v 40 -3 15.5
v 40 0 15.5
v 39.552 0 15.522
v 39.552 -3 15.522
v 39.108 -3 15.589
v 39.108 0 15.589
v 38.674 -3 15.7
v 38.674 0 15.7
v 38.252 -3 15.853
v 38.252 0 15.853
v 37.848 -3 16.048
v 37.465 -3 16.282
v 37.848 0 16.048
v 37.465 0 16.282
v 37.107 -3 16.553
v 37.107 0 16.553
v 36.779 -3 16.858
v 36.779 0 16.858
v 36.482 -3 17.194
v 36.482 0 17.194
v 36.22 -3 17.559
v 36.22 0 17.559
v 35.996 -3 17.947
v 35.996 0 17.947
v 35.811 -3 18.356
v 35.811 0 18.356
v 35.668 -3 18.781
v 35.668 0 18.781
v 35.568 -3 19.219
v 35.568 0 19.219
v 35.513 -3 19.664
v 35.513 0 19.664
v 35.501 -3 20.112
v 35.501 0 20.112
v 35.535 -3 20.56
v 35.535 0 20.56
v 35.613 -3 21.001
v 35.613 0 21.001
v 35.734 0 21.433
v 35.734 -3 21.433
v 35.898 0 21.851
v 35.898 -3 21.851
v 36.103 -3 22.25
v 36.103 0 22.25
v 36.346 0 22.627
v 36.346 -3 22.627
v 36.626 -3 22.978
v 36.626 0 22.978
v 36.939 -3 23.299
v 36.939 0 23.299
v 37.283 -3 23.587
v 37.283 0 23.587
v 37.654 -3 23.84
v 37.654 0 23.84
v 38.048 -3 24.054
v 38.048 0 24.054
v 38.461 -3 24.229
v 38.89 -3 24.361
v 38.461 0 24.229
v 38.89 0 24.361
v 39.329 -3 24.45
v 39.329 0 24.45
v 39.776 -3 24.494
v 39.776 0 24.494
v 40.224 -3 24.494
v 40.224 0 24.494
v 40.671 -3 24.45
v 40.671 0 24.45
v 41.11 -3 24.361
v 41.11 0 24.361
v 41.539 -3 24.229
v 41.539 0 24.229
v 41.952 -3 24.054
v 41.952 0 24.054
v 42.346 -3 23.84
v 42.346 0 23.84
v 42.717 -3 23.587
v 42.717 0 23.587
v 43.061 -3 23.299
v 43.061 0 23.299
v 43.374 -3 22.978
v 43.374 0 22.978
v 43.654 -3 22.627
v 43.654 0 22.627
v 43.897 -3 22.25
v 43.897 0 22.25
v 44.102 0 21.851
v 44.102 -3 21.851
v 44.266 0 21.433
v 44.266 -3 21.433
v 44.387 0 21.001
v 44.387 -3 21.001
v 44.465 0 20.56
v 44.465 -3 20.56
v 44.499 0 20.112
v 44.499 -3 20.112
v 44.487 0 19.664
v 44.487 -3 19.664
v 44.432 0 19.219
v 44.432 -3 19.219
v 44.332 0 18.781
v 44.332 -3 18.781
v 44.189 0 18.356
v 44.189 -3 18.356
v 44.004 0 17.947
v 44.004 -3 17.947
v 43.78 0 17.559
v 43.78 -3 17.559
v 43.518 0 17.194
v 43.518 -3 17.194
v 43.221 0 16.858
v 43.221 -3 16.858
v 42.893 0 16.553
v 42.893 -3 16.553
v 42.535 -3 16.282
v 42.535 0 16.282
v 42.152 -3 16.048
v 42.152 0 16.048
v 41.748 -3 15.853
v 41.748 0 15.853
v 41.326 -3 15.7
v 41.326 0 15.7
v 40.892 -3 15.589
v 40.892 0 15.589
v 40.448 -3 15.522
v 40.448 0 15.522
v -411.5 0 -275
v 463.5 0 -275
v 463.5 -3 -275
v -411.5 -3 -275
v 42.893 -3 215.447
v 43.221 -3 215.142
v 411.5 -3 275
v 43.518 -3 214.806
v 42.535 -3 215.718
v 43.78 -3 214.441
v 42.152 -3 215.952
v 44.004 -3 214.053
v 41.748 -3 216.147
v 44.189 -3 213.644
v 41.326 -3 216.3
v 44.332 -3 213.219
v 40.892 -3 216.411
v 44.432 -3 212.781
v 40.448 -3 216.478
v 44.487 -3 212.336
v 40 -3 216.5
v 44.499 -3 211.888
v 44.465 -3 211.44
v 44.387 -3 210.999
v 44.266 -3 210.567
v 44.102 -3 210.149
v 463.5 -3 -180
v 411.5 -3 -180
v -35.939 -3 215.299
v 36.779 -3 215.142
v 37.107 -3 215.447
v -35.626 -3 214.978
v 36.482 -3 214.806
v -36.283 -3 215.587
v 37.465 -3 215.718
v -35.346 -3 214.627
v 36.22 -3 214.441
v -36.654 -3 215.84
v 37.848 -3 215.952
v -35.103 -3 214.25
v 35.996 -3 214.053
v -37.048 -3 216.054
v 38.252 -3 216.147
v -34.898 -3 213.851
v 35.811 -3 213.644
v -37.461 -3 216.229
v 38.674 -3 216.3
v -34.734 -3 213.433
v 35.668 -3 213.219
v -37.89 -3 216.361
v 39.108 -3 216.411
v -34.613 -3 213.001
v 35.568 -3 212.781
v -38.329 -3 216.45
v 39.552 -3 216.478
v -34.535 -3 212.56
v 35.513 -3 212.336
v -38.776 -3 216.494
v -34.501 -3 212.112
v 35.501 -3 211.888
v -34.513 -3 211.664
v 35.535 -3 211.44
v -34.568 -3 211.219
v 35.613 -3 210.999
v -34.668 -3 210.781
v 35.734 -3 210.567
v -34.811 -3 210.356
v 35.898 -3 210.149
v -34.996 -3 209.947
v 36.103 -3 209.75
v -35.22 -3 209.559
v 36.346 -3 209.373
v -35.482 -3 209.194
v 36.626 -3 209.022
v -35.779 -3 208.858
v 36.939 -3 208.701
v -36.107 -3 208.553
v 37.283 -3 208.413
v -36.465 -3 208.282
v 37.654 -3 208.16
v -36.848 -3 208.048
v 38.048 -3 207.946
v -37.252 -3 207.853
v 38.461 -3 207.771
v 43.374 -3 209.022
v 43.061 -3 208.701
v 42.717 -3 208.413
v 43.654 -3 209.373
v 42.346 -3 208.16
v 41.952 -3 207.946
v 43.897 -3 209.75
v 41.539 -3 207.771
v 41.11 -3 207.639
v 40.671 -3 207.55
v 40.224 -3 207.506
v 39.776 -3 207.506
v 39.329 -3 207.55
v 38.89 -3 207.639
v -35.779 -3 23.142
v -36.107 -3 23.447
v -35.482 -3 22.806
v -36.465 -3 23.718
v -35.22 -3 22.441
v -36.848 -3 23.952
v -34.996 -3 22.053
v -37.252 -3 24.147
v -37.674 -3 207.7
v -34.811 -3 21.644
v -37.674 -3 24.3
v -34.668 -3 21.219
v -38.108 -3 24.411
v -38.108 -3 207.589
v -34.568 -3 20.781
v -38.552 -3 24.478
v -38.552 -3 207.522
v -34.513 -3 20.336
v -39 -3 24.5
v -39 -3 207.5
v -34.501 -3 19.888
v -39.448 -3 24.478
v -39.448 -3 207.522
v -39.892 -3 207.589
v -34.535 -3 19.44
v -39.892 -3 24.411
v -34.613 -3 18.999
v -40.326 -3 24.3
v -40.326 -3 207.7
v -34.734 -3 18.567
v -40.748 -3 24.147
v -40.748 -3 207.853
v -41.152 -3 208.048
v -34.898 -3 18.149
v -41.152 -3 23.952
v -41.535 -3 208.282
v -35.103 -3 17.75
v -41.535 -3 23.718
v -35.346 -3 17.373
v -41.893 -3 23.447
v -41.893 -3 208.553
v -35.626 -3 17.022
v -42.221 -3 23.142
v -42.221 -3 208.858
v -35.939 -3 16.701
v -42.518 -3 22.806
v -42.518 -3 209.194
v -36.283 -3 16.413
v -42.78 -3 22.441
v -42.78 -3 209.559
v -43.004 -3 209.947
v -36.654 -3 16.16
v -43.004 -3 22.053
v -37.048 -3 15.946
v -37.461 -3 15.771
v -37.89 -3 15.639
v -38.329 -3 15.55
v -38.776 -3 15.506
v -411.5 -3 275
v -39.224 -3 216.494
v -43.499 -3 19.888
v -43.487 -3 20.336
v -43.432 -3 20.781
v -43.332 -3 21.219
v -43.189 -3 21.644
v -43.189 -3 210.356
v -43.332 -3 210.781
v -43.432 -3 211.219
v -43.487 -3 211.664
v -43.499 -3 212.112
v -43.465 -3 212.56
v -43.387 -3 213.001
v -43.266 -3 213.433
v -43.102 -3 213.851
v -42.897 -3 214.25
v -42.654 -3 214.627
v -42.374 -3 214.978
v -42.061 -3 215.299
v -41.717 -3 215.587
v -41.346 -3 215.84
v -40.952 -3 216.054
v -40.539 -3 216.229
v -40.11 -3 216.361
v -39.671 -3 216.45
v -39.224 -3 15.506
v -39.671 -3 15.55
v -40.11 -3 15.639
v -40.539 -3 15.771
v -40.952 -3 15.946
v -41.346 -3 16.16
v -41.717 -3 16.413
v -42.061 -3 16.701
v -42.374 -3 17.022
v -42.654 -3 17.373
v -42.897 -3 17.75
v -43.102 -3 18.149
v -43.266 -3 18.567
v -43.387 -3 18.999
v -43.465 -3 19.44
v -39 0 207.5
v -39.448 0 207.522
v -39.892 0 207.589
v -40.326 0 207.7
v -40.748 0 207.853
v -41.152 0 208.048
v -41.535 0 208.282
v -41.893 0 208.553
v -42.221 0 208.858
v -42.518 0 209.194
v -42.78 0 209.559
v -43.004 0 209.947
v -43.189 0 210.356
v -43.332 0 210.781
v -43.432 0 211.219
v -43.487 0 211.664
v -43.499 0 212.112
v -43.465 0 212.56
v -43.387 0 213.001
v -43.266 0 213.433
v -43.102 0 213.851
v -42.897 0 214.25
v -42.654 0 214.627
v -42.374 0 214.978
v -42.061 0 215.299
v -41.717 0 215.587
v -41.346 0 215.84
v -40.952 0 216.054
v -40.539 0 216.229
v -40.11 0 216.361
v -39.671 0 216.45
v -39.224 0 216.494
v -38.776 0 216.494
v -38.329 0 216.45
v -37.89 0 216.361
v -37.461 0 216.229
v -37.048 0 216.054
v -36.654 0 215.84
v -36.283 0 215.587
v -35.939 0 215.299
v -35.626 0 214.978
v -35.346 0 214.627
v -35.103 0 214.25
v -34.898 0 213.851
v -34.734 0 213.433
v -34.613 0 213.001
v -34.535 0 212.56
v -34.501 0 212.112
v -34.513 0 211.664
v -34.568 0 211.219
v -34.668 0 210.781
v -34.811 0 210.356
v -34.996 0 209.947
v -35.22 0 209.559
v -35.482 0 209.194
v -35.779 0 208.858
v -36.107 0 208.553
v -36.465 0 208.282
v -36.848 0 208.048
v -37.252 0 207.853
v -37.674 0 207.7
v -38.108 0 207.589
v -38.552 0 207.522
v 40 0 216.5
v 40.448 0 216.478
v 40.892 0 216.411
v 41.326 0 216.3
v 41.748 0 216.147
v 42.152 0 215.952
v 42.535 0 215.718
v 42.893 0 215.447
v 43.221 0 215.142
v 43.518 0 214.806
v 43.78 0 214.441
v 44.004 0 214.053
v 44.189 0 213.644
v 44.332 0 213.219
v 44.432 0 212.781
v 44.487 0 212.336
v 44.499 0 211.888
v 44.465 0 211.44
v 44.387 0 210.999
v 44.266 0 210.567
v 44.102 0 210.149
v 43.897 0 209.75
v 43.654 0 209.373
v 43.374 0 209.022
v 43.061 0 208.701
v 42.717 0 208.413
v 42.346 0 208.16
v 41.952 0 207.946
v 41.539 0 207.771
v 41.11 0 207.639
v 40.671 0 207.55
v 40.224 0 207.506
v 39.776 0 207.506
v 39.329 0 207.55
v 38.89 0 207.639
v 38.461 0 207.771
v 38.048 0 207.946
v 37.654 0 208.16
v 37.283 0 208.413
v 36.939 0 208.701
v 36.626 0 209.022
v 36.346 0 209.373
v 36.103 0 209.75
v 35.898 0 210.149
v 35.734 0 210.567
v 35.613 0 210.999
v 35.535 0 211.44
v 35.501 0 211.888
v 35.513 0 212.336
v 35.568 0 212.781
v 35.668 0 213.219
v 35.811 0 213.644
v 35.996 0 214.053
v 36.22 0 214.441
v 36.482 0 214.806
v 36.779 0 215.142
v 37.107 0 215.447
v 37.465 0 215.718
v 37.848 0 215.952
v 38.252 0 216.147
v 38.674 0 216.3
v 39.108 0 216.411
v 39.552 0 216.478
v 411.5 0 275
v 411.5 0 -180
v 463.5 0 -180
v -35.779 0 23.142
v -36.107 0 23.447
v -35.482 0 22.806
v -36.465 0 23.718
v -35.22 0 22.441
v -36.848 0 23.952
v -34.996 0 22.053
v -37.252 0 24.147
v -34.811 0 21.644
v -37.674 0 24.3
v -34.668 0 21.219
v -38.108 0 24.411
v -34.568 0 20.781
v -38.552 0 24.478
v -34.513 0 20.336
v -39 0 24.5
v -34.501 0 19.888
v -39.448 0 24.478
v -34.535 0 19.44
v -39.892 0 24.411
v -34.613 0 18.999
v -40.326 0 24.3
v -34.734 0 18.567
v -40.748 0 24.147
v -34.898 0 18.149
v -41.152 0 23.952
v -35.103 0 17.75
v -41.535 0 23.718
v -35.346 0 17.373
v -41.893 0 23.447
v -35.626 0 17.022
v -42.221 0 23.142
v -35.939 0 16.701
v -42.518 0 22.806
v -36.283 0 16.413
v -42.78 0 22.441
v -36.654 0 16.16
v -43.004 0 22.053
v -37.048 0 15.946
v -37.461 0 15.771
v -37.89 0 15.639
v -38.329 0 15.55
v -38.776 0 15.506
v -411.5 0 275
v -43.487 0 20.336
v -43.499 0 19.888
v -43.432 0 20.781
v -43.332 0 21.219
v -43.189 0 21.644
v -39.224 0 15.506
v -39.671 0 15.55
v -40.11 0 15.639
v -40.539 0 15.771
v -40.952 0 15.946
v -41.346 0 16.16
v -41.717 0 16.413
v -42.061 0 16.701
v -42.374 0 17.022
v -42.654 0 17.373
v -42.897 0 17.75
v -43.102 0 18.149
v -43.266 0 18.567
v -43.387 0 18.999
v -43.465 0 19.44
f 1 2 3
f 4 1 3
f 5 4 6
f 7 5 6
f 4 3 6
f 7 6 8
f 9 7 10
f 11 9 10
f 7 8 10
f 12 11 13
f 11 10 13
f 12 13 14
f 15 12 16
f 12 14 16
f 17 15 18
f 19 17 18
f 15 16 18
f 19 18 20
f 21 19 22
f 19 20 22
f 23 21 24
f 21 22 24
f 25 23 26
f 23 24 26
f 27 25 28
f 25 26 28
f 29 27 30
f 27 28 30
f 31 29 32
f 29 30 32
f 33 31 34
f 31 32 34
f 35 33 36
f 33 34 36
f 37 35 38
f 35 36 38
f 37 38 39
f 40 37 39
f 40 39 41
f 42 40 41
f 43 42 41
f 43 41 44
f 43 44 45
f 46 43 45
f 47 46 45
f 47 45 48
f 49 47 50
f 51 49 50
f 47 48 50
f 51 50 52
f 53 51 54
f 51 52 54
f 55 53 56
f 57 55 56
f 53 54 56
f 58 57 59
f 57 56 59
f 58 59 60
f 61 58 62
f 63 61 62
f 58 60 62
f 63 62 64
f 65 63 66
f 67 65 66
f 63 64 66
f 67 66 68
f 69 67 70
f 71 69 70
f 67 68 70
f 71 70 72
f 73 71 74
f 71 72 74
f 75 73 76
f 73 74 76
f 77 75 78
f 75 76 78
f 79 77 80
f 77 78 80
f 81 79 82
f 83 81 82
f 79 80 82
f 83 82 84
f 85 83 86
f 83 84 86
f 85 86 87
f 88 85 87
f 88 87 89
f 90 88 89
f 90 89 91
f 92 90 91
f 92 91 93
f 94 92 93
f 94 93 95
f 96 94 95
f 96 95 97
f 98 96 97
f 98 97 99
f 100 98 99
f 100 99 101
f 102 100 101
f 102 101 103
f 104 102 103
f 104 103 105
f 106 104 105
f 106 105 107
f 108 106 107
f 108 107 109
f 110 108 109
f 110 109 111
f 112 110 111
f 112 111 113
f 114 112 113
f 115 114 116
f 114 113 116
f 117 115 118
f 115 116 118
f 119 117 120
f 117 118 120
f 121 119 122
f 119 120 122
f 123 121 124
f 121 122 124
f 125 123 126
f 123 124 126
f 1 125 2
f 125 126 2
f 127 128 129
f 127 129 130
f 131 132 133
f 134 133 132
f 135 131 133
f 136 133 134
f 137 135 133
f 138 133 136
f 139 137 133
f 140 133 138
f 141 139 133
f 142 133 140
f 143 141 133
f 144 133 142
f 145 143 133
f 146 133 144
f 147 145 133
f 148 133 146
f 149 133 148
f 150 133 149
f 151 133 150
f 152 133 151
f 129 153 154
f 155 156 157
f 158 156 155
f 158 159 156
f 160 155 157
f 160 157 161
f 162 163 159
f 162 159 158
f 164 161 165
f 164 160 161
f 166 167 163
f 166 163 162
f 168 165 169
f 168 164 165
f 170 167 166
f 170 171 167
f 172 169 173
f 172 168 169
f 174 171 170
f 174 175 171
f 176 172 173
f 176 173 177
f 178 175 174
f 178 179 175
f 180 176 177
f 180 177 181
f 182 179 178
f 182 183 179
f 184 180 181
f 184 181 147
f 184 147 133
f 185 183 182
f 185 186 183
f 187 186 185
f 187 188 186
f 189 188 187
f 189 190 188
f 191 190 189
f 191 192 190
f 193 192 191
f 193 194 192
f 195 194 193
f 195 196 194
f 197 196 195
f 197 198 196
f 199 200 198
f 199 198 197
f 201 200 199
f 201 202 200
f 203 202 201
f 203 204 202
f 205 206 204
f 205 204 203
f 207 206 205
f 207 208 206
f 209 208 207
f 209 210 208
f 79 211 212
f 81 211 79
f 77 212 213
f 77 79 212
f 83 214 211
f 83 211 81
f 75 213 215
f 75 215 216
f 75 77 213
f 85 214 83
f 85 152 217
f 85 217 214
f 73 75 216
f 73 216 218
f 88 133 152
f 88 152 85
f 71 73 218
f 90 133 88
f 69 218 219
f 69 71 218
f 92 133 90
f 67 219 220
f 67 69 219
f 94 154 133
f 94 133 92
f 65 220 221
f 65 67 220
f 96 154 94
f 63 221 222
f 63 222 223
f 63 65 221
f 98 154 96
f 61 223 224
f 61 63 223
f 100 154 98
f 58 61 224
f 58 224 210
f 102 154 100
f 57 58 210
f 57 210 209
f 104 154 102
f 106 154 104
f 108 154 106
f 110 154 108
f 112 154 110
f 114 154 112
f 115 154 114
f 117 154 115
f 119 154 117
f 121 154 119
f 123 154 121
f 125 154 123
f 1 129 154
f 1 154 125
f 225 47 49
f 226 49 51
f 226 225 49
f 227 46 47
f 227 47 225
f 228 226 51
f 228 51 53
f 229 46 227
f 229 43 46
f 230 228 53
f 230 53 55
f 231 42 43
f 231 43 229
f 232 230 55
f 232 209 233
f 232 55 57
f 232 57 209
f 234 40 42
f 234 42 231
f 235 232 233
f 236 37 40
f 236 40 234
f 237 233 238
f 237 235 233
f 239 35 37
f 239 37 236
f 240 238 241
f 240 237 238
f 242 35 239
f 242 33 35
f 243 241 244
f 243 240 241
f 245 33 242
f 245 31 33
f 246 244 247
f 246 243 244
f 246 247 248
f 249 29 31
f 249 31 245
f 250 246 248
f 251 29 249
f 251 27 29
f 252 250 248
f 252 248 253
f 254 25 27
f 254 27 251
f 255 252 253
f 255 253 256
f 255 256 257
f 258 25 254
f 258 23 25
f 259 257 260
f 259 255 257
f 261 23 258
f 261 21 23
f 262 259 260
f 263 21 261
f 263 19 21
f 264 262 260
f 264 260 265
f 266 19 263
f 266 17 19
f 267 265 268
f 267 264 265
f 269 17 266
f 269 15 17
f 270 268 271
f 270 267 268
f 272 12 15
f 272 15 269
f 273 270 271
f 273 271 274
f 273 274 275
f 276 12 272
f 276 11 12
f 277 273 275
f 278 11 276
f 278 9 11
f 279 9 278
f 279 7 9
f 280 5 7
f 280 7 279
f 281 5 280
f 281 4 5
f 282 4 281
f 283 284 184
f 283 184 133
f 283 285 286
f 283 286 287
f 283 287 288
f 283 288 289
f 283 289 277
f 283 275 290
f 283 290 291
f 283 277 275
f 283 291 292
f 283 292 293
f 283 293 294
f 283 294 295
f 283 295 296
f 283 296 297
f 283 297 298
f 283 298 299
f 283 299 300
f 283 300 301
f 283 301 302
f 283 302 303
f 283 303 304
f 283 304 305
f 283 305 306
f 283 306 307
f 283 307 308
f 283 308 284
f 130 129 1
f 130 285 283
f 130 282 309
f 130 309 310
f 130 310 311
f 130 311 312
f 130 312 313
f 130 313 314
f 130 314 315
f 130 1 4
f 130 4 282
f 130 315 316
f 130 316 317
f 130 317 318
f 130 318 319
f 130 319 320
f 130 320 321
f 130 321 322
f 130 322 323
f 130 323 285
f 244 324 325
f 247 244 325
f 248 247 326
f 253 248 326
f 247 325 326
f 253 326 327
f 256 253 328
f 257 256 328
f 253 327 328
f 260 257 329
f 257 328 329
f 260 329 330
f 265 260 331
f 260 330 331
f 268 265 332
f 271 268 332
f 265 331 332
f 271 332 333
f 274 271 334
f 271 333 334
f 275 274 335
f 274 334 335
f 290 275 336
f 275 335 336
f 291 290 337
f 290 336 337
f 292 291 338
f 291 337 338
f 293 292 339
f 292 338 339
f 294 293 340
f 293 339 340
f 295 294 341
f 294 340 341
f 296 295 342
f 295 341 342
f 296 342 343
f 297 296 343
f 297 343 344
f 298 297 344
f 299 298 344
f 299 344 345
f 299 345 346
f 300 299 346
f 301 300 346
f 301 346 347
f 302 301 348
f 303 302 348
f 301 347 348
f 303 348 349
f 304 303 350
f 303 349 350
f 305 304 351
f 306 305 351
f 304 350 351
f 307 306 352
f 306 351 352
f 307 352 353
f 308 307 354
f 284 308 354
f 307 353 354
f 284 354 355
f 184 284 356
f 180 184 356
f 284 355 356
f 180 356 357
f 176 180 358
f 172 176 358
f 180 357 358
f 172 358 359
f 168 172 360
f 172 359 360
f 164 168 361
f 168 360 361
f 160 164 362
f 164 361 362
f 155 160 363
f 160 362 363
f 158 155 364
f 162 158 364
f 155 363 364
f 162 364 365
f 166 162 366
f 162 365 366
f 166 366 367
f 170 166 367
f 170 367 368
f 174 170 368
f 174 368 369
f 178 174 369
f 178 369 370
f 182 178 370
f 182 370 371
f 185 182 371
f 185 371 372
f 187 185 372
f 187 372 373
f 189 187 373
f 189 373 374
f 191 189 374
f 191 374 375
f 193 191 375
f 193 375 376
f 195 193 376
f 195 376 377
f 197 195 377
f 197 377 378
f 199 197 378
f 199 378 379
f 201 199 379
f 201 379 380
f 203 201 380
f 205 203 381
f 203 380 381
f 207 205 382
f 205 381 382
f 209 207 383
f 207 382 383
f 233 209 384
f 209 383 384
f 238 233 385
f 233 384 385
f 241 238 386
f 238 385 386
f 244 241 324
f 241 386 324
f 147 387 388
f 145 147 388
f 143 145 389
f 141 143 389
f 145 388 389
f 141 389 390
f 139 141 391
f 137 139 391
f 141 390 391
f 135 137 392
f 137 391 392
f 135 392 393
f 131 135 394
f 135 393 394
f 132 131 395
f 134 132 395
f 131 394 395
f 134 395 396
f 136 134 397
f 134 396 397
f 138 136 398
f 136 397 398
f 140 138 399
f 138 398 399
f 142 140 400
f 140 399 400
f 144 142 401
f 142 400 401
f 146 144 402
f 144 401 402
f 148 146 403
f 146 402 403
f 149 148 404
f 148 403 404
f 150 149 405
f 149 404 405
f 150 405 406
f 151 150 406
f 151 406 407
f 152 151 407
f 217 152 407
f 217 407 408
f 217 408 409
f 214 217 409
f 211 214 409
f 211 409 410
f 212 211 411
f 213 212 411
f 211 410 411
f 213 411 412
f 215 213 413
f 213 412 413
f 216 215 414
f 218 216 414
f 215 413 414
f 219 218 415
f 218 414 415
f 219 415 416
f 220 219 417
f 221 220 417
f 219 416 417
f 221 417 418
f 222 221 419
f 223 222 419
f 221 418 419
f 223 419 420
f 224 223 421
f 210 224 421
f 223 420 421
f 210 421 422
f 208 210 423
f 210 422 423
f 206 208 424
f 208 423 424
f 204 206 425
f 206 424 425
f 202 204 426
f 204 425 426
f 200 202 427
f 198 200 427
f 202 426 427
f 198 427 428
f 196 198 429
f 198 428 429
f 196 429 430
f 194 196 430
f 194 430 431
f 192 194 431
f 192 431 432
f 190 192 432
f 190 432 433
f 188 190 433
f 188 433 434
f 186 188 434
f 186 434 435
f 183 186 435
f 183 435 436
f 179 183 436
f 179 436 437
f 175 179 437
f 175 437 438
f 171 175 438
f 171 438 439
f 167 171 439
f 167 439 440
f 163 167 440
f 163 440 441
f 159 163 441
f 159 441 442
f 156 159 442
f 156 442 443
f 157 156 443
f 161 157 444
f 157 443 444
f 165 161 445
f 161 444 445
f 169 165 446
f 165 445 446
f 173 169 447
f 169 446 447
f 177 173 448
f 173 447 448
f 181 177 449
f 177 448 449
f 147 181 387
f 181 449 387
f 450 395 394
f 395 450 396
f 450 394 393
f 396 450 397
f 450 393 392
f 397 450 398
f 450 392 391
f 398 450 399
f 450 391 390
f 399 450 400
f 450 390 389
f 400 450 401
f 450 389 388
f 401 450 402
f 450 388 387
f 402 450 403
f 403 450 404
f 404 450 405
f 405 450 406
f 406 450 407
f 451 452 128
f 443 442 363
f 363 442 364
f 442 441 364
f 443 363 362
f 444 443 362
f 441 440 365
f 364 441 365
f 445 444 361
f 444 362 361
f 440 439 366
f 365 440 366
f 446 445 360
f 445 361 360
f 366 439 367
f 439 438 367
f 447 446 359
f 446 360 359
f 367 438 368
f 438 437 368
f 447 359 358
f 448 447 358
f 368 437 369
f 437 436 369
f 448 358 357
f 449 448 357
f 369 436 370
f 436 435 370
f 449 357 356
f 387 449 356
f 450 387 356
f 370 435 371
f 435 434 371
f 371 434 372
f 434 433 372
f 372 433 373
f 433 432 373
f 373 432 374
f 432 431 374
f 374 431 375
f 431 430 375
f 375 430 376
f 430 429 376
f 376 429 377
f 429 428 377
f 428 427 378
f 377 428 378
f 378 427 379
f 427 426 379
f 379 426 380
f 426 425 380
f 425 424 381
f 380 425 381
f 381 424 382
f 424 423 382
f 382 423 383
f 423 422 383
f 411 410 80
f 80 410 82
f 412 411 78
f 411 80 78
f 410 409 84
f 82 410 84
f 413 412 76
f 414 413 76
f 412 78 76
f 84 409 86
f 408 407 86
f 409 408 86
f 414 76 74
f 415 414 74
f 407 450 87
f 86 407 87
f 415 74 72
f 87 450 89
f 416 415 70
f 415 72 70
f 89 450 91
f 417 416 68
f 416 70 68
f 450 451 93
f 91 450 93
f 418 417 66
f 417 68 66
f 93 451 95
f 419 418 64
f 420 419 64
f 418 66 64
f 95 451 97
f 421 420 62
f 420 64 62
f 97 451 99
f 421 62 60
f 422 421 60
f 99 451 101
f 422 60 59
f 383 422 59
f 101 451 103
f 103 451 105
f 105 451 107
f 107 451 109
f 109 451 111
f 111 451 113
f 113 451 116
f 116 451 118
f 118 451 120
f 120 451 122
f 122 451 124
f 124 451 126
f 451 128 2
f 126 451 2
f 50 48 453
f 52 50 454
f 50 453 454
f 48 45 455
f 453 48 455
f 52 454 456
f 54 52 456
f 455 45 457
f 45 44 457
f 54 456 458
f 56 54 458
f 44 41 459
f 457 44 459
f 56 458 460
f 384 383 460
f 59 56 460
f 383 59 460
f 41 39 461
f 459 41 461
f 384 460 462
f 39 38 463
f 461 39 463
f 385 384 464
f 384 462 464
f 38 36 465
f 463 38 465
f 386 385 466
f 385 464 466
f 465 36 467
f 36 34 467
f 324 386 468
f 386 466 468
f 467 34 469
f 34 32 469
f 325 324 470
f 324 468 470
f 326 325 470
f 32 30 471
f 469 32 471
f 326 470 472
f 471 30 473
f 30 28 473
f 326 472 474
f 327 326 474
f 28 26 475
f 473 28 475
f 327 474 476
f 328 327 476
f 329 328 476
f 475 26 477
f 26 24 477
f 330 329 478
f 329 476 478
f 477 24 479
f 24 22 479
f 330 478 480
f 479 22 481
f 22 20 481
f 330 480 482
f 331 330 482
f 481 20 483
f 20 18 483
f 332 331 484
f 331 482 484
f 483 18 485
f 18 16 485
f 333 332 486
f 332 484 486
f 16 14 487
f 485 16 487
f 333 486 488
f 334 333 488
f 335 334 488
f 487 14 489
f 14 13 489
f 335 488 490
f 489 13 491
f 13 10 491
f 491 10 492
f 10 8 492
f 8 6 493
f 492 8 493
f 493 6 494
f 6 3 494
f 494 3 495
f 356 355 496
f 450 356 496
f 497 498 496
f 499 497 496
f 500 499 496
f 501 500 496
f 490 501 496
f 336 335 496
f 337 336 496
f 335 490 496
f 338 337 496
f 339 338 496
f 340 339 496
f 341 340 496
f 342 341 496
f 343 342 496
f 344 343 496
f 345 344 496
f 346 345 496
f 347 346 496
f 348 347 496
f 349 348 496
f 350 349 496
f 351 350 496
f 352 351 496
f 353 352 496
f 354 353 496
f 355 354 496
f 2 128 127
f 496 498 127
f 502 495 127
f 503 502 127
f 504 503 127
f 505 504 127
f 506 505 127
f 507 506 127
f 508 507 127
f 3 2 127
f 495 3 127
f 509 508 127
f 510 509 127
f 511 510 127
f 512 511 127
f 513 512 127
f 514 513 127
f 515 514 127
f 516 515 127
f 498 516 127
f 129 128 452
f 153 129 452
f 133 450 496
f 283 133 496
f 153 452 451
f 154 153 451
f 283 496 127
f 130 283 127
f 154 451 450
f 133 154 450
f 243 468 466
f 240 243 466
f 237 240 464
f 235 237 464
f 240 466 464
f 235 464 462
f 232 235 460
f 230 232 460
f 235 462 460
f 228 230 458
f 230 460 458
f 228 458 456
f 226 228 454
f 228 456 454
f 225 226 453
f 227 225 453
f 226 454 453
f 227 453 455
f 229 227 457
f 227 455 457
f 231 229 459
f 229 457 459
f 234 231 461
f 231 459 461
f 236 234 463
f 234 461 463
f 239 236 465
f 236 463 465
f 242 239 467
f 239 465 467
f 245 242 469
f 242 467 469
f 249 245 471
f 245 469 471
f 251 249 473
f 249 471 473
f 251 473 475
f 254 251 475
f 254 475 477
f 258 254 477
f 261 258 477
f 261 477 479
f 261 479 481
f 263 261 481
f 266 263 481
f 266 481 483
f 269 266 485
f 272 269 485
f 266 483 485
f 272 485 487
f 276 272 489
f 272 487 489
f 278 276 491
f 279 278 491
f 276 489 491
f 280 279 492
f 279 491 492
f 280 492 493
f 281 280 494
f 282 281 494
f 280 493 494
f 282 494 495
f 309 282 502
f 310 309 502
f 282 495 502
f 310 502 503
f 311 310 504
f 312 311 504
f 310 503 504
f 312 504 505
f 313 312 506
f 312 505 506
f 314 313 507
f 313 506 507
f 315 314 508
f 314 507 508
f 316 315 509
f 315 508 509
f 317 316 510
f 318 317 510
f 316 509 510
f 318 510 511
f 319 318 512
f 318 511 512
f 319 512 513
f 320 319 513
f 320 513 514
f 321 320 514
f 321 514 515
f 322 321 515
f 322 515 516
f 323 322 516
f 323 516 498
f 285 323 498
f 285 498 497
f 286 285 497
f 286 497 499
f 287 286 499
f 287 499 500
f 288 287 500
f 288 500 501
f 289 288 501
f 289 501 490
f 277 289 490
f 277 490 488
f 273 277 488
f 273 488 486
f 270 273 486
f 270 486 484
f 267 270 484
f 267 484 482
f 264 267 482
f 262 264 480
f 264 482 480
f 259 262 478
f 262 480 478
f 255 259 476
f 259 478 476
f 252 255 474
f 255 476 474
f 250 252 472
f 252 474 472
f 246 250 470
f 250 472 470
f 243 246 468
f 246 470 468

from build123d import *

# Parameters (mm, degrees)
SKETCH1_R          = 4.5
BASE_FLANGE1_DEPTH = 3


# Sheet-metal steps are written as plain solids
with BuildPart() as part:
    # Sketch1 → Base-Flange1 (new body)
    with BuildSketch(Plane(origin=(0, 0, 0), x_dir=(1, 0, 0), z_dir=(0, 1, 0))):
        Polygon((411.5, 275), (463.5, 275), (463.5, 180), (411.5, 180), (411.5, -275), (-411.5, -275), (-411.5, 275), align=None)
        with Locations(Location((-39, -212, 0), (0, 0, 90))):
            Circle(SKETCH1_R, mode=Mode.SUBTRACT)
        with Locations(Location((-39, -20, 0), (0, 0, 270))):
            Circle(SKETCH1_R, mode=Mode.SUBTRACT)
        with Locations(Location((40, -20, 0), (0, 0, 90))):
            Circle(SKETCH1_R, mode=Mode.SUBTRACT)
        with Locations(Location((40, -212, 0), (0, 0, 270))):
            Circle(SKETCH1_R, mode=Mode.SUBTRACT)
    extrude(amount=-BASE_FLANGE1_DEPTH)


solid = part.part
